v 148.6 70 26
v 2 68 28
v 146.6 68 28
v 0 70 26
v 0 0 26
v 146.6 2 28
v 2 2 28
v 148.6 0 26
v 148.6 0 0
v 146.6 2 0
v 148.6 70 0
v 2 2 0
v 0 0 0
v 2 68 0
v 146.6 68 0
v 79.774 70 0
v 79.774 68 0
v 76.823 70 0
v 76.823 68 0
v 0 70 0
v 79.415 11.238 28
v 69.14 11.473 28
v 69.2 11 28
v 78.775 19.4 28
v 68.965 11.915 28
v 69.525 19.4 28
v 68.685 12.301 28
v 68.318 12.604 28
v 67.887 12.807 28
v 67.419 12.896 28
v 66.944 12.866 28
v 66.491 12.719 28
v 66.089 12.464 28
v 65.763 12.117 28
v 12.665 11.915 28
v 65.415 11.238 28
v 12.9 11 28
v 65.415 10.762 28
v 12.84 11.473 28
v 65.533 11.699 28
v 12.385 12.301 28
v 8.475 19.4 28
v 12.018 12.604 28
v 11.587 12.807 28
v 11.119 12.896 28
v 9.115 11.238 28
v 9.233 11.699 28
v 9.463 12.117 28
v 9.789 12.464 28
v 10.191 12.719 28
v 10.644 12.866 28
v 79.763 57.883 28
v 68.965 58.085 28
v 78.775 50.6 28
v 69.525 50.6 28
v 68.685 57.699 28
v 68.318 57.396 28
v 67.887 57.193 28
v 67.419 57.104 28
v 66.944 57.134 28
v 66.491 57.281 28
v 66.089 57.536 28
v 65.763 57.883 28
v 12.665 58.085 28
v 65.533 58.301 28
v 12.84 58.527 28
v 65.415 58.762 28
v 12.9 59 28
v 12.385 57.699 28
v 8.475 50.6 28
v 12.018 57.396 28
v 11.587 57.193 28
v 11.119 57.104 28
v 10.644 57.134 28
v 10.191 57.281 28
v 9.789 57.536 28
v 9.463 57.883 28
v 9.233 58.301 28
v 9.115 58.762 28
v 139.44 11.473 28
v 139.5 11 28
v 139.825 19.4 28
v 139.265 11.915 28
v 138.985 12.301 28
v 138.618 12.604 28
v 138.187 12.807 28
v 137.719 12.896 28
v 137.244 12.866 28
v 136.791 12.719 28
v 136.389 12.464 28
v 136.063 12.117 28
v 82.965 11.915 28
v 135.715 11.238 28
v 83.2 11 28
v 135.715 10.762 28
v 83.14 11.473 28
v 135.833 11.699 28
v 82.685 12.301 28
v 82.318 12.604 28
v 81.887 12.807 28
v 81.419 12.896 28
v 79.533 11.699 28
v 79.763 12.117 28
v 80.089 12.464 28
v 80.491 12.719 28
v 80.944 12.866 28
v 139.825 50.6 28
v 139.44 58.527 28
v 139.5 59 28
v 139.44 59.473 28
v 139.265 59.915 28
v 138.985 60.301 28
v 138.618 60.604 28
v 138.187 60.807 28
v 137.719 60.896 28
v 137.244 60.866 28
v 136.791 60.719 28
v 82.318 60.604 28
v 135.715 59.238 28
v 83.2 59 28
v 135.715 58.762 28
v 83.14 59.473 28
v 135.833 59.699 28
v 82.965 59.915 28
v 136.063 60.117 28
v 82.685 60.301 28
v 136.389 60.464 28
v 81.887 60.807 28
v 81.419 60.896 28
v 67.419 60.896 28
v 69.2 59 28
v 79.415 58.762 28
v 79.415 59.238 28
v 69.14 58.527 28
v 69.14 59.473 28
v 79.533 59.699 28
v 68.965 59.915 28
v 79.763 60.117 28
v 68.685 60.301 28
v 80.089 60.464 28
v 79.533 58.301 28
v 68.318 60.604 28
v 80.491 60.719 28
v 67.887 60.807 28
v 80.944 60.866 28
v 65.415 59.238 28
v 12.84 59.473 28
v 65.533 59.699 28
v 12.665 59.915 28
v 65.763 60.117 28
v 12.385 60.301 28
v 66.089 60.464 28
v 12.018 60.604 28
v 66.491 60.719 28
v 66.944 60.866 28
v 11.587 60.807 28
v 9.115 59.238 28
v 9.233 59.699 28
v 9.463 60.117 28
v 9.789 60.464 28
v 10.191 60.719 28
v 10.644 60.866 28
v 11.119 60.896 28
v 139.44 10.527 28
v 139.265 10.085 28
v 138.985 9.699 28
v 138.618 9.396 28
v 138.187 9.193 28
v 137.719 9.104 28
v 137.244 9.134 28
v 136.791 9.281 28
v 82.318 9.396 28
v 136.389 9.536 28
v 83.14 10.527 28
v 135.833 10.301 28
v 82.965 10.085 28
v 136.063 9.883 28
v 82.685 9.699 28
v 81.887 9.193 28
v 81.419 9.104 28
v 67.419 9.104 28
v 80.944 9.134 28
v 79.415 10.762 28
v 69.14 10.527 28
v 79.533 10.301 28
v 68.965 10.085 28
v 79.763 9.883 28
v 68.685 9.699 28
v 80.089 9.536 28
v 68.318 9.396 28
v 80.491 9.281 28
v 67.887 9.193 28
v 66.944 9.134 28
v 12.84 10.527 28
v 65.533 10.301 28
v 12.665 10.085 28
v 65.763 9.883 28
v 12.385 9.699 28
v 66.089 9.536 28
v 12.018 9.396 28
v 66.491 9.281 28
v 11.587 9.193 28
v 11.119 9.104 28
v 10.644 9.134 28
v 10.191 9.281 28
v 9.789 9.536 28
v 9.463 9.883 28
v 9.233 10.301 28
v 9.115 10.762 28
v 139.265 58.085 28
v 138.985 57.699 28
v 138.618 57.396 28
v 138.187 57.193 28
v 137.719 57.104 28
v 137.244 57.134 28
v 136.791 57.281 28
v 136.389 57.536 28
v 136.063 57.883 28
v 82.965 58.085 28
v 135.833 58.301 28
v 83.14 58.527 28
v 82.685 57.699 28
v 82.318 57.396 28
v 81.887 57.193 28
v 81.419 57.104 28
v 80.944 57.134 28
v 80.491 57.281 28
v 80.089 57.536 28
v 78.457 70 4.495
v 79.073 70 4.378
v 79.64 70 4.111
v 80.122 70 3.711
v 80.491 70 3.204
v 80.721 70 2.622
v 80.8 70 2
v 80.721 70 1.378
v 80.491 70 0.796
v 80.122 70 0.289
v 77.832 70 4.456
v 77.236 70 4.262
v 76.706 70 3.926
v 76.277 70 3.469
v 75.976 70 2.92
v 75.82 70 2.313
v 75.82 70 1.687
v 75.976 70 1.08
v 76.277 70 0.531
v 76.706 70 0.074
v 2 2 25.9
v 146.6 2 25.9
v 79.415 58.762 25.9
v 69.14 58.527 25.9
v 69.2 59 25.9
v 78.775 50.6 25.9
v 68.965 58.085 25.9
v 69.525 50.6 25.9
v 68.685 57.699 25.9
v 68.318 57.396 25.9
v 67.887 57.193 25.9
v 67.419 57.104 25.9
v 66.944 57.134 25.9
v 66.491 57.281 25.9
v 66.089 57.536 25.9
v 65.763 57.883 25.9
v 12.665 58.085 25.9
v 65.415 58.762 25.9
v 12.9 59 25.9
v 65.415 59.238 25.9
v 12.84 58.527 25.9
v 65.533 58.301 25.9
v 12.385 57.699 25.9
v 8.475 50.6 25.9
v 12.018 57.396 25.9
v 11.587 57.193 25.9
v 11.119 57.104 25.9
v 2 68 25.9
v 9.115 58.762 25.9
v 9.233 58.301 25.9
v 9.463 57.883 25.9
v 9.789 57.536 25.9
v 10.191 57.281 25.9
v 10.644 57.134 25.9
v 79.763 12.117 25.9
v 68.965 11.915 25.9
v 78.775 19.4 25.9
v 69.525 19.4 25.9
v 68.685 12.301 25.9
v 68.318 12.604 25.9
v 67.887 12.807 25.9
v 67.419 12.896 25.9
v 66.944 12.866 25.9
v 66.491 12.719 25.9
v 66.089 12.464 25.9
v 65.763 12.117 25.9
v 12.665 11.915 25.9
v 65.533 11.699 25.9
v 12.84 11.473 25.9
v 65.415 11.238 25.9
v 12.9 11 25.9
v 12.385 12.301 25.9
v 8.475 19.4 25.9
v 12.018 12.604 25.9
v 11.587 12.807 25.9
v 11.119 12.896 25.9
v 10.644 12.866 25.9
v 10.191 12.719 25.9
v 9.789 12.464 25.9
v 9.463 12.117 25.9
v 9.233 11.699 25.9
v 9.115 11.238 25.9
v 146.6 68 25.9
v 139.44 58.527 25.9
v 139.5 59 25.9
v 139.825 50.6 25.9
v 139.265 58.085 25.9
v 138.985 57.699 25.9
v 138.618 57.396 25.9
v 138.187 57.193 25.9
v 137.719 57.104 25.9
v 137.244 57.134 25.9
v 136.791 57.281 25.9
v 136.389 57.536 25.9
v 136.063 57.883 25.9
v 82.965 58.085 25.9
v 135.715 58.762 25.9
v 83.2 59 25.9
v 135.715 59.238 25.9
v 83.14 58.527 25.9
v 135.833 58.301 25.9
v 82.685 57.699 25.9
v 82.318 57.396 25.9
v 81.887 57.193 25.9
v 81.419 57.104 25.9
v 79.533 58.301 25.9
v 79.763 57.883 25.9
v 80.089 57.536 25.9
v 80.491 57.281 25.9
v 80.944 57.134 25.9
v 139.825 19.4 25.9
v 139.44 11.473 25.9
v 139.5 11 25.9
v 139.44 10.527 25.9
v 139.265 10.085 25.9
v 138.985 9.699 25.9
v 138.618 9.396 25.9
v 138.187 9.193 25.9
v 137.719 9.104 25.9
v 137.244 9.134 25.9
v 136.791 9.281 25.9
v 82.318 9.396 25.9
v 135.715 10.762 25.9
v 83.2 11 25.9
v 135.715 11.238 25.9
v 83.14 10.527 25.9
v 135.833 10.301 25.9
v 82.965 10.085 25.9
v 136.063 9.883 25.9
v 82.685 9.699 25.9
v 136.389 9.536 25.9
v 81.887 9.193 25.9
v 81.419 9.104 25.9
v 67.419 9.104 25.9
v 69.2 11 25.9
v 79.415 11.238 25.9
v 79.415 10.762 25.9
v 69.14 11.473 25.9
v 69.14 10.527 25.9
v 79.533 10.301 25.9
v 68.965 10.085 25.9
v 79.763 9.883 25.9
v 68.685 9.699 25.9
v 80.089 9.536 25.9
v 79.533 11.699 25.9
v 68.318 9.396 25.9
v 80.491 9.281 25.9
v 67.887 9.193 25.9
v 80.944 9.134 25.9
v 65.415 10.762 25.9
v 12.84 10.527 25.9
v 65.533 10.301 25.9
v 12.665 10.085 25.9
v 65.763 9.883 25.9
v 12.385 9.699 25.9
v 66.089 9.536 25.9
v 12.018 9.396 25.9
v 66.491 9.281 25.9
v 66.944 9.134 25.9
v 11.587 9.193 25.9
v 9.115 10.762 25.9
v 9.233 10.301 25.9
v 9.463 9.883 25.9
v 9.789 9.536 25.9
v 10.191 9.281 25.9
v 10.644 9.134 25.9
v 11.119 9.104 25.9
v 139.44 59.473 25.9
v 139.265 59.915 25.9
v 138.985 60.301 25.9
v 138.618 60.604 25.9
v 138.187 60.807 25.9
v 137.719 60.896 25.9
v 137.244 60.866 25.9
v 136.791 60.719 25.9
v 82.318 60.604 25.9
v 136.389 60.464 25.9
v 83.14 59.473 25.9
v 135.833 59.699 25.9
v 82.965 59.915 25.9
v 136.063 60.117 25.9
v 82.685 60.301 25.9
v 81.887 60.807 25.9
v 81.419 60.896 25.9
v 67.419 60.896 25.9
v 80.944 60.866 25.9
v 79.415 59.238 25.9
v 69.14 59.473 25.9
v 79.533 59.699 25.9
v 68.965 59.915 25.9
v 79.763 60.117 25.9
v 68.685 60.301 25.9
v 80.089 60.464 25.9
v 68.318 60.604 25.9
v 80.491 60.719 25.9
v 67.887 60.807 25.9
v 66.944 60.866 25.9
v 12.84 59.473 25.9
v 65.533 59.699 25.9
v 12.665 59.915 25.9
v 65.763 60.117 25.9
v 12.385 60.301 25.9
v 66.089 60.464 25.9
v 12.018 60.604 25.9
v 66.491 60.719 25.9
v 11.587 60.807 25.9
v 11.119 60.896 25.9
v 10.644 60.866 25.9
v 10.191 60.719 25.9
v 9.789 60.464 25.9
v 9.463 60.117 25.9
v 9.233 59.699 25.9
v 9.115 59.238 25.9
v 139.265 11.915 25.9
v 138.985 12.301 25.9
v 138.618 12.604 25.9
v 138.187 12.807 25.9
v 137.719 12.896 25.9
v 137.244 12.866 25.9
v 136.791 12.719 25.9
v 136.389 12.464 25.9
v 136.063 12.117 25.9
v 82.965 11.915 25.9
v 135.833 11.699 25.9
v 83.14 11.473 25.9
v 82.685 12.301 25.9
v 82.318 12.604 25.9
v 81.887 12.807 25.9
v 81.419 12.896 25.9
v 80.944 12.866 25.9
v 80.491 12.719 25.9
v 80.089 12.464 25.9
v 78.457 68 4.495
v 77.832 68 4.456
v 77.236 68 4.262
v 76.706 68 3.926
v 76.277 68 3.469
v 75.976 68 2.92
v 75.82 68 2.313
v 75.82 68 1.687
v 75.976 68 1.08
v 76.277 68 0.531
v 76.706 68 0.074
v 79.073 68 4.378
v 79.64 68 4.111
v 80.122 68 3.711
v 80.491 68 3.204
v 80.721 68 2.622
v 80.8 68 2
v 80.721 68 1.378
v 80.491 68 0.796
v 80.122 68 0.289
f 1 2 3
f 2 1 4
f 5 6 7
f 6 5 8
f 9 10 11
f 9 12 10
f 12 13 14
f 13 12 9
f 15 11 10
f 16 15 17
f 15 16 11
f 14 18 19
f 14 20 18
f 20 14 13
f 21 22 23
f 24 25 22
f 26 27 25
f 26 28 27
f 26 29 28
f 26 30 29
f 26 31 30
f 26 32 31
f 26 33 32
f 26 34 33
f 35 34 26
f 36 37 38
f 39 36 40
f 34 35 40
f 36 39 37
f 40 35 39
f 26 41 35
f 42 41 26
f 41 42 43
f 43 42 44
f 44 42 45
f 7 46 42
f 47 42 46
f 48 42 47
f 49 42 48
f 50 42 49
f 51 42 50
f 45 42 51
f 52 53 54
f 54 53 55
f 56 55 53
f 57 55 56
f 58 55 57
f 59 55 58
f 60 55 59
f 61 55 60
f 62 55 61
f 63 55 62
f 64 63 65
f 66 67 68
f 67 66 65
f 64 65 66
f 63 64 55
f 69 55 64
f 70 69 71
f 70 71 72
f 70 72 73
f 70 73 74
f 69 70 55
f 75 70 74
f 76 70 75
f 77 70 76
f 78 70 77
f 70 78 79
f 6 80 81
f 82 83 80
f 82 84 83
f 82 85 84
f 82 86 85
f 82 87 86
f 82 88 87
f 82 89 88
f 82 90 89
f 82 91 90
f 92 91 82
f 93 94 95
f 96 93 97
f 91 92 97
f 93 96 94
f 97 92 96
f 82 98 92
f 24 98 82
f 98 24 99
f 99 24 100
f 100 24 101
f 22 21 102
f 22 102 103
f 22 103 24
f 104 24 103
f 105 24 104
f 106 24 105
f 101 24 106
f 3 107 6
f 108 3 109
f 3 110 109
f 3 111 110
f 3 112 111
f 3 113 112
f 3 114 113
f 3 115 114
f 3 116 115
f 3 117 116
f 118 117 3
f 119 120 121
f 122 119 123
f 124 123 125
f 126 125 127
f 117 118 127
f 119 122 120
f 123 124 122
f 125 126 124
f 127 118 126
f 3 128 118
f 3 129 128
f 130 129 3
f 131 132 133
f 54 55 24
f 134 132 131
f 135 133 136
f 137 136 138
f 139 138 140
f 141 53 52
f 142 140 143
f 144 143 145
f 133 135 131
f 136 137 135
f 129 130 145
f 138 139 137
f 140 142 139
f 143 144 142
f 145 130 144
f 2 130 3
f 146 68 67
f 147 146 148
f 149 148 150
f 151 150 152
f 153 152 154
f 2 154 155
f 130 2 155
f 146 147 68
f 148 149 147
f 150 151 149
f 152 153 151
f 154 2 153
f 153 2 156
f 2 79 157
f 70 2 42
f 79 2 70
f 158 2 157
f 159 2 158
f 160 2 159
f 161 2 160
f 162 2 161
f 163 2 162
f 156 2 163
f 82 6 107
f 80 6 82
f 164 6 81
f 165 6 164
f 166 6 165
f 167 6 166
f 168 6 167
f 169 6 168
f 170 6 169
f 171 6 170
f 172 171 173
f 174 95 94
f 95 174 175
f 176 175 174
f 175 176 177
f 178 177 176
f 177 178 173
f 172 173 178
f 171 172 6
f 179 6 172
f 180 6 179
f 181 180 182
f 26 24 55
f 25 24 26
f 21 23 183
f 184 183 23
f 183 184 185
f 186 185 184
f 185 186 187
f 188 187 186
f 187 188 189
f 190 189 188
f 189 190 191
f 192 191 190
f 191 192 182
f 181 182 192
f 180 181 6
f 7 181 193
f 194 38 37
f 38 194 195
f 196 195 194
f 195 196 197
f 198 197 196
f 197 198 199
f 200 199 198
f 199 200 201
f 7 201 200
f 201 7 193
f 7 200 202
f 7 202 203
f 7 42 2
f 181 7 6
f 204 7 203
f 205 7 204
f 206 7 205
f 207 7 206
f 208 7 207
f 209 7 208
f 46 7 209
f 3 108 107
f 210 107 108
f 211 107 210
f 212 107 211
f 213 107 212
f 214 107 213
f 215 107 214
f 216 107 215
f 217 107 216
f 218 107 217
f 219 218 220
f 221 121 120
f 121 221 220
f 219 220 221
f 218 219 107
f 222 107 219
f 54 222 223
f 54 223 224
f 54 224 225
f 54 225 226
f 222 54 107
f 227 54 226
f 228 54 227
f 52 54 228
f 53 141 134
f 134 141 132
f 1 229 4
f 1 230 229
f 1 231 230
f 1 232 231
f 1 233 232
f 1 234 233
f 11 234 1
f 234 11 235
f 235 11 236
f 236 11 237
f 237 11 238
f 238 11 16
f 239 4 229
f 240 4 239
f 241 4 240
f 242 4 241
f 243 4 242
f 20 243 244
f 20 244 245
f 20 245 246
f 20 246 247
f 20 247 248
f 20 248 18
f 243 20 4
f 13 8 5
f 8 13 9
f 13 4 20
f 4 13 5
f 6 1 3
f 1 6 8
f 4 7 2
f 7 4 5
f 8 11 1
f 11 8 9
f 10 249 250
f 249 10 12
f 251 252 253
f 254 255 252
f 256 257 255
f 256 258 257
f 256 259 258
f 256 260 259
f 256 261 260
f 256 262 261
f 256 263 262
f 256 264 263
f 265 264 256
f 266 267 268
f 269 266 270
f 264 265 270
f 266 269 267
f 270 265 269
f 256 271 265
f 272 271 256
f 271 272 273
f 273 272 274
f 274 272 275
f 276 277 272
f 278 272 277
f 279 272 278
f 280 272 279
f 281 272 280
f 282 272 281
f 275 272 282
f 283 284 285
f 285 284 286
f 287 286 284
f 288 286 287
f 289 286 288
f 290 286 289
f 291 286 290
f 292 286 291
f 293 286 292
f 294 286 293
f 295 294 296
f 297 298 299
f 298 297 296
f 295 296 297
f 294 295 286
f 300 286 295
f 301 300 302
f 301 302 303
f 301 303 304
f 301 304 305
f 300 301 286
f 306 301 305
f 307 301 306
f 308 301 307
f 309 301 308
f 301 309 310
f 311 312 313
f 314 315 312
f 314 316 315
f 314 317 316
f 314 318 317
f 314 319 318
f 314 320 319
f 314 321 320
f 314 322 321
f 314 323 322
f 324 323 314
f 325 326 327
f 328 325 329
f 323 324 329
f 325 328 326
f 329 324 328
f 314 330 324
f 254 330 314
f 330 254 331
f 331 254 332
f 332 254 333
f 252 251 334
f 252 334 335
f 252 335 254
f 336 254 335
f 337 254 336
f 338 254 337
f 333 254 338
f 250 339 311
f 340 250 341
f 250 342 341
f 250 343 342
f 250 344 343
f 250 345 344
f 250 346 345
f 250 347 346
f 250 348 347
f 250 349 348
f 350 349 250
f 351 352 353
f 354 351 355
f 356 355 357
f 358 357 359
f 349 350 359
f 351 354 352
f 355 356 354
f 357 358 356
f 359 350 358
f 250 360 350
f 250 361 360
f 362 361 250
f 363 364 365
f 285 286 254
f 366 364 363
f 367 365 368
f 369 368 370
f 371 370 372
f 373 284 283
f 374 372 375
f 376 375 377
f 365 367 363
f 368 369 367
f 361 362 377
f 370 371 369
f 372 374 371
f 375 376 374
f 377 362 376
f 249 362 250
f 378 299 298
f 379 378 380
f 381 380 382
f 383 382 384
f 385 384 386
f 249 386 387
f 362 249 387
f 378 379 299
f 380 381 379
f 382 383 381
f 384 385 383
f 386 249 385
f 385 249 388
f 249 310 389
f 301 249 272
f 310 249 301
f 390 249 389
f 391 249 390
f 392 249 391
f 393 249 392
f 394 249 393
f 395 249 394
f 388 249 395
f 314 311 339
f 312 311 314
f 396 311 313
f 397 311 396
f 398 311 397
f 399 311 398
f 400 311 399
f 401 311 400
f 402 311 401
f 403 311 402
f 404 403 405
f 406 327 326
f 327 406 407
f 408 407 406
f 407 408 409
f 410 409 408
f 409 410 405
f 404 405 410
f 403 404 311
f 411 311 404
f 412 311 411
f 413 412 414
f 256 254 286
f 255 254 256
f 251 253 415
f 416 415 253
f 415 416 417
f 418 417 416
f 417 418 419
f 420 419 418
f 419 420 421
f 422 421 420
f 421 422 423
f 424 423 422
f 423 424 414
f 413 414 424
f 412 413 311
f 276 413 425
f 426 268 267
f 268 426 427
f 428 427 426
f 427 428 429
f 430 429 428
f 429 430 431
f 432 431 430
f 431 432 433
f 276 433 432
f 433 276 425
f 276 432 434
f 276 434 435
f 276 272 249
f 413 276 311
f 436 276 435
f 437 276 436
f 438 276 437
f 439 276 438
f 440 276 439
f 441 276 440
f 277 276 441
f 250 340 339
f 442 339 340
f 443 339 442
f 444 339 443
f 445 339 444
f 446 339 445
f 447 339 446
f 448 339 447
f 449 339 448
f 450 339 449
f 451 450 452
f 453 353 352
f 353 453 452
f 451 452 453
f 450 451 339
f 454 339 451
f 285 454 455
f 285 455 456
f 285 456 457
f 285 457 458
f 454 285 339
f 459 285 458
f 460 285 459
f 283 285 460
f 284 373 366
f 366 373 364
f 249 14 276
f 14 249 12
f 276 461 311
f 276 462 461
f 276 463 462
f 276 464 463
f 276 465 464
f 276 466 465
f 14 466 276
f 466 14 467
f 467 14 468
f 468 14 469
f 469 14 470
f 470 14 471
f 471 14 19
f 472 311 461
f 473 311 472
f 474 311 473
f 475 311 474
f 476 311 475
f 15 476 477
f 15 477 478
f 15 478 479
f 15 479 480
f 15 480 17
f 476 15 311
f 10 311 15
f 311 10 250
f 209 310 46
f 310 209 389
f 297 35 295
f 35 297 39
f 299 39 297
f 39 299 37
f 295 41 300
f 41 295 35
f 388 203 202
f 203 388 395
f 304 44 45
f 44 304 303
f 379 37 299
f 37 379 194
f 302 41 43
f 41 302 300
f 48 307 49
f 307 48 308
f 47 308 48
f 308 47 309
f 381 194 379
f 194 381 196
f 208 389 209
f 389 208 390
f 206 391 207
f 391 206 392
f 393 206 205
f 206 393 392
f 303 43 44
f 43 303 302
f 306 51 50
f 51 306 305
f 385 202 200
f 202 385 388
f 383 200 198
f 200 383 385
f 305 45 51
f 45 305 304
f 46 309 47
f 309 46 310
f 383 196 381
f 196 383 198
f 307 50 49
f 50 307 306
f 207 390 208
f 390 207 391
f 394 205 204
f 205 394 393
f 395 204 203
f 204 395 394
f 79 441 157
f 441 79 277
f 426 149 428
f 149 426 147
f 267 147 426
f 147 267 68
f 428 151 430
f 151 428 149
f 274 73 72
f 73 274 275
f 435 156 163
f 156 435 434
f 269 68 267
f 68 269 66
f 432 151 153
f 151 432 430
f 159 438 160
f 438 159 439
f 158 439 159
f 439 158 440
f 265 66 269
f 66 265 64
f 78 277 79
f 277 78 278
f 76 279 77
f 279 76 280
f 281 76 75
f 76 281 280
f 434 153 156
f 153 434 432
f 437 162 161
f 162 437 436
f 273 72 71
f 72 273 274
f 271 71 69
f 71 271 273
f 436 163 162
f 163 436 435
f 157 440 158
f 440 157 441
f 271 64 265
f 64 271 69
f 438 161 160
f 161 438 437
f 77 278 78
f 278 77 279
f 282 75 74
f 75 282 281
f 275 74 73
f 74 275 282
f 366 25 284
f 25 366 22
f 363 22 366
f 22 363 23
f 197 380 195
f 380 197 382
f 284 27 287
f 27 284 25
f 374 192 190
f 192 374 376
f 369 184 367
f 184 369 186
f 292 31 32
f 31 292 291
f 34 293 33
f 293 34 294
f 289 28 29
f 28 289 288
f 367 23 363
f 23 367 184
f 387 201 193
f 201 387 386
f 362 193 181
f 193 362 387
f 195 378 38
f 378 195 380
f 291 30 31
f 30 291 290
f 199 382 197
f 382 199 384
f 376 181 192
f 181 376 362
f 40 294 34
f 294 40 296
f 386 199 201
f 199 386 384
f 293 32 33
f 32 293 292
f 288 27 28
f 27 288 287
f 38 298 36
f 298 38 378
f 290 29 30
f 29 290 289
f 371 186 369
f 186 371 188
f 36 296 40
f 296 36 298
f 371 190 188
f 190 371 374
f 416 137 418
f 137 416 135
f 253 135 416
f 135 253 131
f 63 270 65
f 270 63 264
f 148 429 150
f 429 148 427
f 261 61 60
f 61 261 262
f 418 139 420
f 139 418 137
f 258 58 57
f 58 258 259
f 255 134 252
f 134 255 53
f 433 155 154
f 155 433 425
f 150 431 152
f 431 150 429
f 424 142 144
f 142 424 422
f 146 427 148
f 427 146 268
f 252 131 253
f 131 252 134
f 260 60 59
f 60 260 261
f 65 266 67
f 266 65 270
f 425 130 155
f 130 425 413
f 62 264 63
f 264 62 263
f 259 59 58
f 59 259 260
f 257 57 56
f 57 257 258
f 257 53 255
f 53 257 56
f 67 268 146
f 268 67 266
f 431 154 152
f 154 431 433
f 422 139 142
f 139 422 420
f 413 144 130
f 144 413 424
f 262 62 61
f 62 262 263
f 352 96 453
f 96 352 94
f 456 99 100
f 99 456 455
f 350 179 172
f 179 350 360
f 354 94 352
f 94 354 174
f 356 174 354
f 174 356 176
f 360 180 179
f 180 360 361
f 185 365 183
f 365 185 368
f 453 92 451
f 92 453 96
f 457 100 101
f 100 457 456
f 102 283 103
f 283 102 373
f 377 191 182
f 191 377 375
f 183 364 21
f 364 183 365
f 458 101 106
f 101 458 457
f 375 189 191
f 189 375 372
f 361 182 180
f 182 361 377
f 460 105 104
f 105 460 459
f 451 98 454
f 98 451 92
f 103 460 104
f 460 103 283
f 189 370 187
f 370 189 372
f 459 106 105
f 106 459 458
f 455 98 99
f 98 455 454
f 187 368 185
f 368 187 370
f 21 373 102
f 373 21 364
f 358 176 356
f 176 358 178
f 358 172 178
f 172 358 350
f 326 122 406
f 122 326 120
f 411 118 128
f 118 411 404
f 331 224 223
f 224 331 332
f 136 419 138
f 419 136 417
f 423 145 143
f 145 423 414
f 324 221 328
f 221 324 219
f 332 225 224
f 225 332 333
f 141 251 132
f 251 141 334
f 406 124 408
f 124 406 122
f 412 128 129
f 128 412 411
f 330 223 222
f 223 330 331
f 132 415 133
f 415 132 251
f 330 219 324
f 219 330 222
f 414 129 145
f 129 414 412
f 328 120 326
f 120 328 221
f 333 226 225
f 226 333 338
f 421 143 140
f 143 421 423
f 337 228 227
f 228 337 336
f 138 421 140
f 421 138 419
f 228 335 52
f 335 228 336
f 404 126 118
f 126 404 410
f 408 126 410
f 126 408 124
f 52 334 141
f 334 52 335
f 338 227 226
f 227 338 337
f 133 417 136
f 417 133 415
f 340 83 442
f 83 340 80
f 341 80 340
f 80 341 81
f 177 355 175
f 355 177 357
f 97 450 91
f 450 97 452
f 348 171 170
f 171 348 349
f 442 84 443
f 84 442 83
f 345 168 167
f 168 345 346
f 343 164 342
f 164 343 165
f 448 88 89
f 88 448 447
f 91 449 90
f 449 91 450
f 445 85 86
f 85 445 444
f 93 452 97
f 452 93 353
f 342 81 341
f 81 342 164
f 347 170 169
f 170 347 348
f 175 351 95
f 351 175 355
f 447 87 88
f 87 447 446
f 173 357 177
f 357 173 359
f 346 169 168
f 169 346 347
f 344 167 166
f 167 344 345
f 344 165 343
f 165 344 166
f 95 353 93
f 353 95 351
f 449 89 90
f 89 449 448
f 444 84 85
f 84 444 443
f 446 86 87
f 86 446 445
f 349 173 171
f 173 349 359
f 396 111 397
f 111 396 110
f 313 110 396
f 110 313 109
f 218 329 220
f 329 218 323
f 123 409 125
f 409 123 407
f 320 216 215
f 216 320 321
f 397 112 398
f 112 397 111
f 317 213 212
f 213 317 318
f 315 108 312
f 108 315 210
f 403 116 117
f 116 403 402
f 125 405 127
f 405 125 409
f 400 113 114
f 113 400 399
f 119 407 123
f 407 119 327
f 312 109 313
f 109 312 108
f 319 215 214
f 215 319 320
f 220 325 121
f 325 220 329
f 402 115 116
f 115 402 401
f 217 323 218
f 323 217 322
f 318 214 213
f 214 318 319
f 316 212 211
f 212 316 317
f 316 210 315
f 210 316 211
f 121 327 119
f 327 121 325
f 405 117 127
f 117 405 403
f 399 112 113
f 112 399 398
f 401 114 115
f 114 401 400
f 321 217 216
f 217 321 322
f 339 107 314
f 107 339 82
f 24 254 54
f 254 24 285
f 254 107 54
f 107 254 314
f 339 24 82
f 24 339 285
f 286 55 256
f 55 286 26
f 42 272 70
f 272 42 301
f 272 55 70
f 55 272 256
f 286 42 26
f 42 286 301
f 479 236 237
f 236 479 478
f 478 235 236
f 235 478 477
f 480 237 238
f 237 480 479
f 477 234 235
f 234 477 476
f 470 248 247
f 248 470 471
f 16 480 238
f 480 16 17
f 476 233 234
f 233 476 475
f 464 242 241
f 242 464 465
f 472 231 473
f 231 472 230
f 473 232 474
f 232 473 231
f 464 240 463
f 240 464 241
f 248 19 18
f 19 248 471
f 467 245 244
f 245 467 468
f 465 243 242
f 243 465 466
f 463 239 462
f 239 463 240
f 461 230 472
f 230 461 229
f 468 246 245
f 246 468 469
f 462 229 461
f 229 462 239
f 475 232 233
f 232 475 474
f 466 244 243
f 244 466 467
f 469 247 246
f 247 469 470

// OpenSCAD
/* This is a customizable housing for lixie displays

    Dustin Westaby 
    Nov 2022

    USAGE:
    
    Enter the number of displays you want, and you will get an object that you can print as is, or split up for your printer
    
*/

// ********************
// USER DEFINES
// ********************
// Set options here

digits = 2; //Min is 1

chamfer = 2;

screw_hole_diameter = 3; //M3 = 3mm

want_button = 0;

want_power_cable = 1;

want_pre_cuts_and_glue_tabs = 1;

switch_hole_diameter = 12; //set want_button=1

usb_cable_diameter = 5;  //set want_power_cable=1

window_x = 59.05;
window_y = 29.20;

max_printer_bed_size = 180; //set want_pre_cuts_and_glue_tabs=1, Prusa Mk3 = 21cm (8.3")

// ********************
// CALCULATED
// ********************

side_wall_thickness = 2; //2 or 3mm

top_wall_thickness = 2 ;

loose_fit = 2.0;
slide_fit = 0.2;
friction_fit = 0.02;

center_digits = digits-2;

edge_length = 74.3;
center_length = 70.3;

outer_length_x = edge_length*2 + center_digits*center_length;
outer_width_y  = 70;

outer_depth_z  = 26 + top_wall_thickness;

switch_hole_z_offset_from_center = outer_depth_z/2-top_wall_thickness/2;

window_x_size_adj = window_x + loose_fit;
window_y_size_adj = window_y + loose_fit;

glue_tab_insert_depth = 4;

// ********************
// MODULES
// ********************

//max_printer_bed_size
if((want_pre_cuts_and_glue_tabs == 0) || outer_length_x < max_printer_bed_size)
{
    draw_body();
}
else
{
    cut_offsets = glue_tab_insert_depth*2;
    
    //cut up the body every max_printer_bed_size size

    number_of_cuts = ceil(outer_length_x / max_printer_bed_size); //round up
    negative_width = number_of_cuts - 1;
    
    //left side
    draw_body_cut(
        x1_position = outer_length_x * 1 / number_of_cuts, 
        cut_width  = outer_length_x  * negative_width / number_of_cuts, 
        cut_offset = cut_offsets * 0, 
        want_tabs  = true);
    
    //inner parts
    if(number_of_cuts-2 > 0)
    {
        for(i = [1 : number_of_cuts-2])
        {
            cut_width = outer_length_x  * negative_width / number_of_cuts;
            slice_width = outer_length_x / number_of_cuts;
            
            draw_body_cut(
                x1_position = -cut_width+slice_width*i, 
                x2_position = slice_width*(i+1), 
                cut_width  = cut_width,
                cut_offset = cut_offsets * i, 
                want_tabs  = true);
        }
    }
    
    //right side
    draw_body_cut(
        x1_position = 0, 
        cut_width  = outer_length_x  * negative_width / number_of_cuts, 
        cut_offset = cut_offsets * (number_of_cuts-1), 
        want_tabs  = false);
    
}

module draw_body_cut(x1_position, x2_position=0, cut_width, cut_offset, want_tabs=false)
{
    translate([cut_offset,0,0]) 
    difference()
    {
        draw_body();
        
        //cutter 1
        translate([x1_position-1,-1,-1]) 
        cube([cut_width+2,outer_width_y+2,outer_depth_z+2]);
        
        //cutter 2
        if(x2_position != 0) translate([x2_position-1,-1,-1]) 
        cube([cut_width+2,outer_width_y+2,outer_depth_z+2]);
    }
    if(want_tabs)
    {
        if(x2_position > 0)
        {
            glue_tabs((x2_position - 1 + cut_offset) - glue_tab_insert_depth);
        }
        else
        {
            glue_tabs((x1_position - 1) - glue_tab_insert_depth);
        }
    }
}

module draw_body()
{
    difference()
    {
        union()
        {
            outer_base_shape(use_chamfer=true);
            if(want_button) draw_switch_outline();
        }
        
        inner_base_shape();
        
        display_and_screw_cutouts();
        
        if(want_button) draw_button();
            
        if(want_power_cable) draw_power_cable();
    }
}

//TBD, tabs
module glue_tabs(x_position)
{
    translate([x_position,0,0])
    {
        translate([0,side_wall_thickness,0])
        glue_tab();
        
        translate([0,outer_width_y-side_wall_thickness*2,0])
        glue_tab();
    }
}

module glue_tab()
{
    z_alignment = 0.5;
    
    tab_height = outer_depth_z-top_wall_thickness*2-4;
    
    //tab
    cube([glue_tab_insert_depth*2, side_wall_thickness, tab_height+z_alignment]);
    
    //printability ledge
    translate([-glue_tab_insert_depth+0.68,0,0])
    difference()
    {
        translate([0,0,tab_height+z_alignment])
        rotate([0,45,0]) cube([glue_tab_insert_depth*2, side_wall_thickness, glue_tab_insert_depth*2]);
        
        translate([-glue_tab_insert_depth*1.17,-2,0])
        cube([glue_tab_insert_depth*2, side_wall_thickness+4, tab_height*2+z_alignment]);
    }
}


module draw_power_cable()
{
    
    hole_depth = side_wall_thickness*2;
    x_position = outer_length_x-(edge_length-side_wall_thickness*2);
    
    //switch_hole_diameter
    translate([x_position,outer_width_y-hole_depth-0.1,usb_cable_diameter/2-0.5]) 
    //cube([usb_cable_diameter,hole_depth+0.2,usb_cable_diameter]);
    rotate([-90,0,0])
    cylinder(d=usb_cable_diameter, h=hole_depth+0.2, $fn=25);
}

module screw_hole()
{
    //for nuts and bolts to BASES.dxf
    cylinder(d=screw_hole_diameter + slide_fit*2 + slide_fit*2, h=outer_depth_z*2, $fn=25);
}

module screw_hole_set(x_offset)
{
    edge_x_offset = 11+x_offset;
    edge_y_offset = 11;
    window_width = 56.3;
    
    translate([edge_x_offset,edge_y_offset,0]) screw_hole();
    translate([edge_x_offset,outer_width_y-edge_y_offset,0]) screw_hole();
    
    translate([window_width+edge_x_offset,edge_y_offset,0]) screw_hole();
    translate([window_width+edge_x_offset,outer_width_y-edge_y_offset,0]) screw_hole();
}

module draw_button()
{
    draw_switch_holes();
}


module draw_switch_cyl(diameter)
{
    hole_depth = side_wall_thickness*1.1;
    x_position = outer_length_x-(edge_length-side_wall_thickness*2);
    
    //switch_hole_diameter
    translate([x_position,0+hole_depth/2-0.01,switch_hole_z_offset_from_center]) rotate([90,0,0]) cylinder(h=hole_depth, d=diameter);
}

module draw_switch_outline()
{
    switch_outline_pad = 2.25;
    draw_switch_cyl(switch_hole_diameter+switch_outline_pad);
}

module draw_switch_holes()
{
    translate([0,-0.01,0]) draw_switch_cyl(switch_hole_diameter);
    translate([0,2,0]) draw_switch_cyl(switch_hole_diameter+4);
}


module display_and_screw_cutouts()
{
    x_offset = center_length;
    
    display_cutout(0);
    screw_hole_set(0);
    
    if(center_digits > 0)
    {
        for(i = [0 : center_digits])
        {
            screw_hole_set(x_offset*(i+1));
            display_cutout(x_offset*(i+1));
        }
        display_cutout(x_offset*(center_digits+1));
    }
    else
    {
        display_cutout(x_offset);
        screw_hole_set(x_offset);
    }
}

module display_cutout(x_offset)
{
    display_x_position = -window_x_size_adj/2+39+x_offset;
    display_y_position = -window_y_size_adj/2+35;
    
    translate([display_x_position,display_y_position,-0.5])
    cube([window_x_size_adj,window_y_size_adj,outer_depth_z+1]);
}

module outer_base_yz_2d_shape(chamfer_adj)
{
    polygon(points=[
        [0,0],
        [outer_depth_z-chamfer_adj, 0],
        [outer_depth_z,             chamfer_adj],
        [outer_depth_z,             outer_width_y-chamfer_adj],
        [outer_depth_z-chamfer_adj, outer_width_y],
        [0,                         outer_width_y],
    ]);
}

module outer_base_xz_2d_shape(chamfer_adj)
{
    polygon(points=[
        [0,0],
        [outer_depth_z-chamfer_adj, 0],
        [outer_depth_z,             chamfer_adj],
        [outer_depth_z,             outer_length_x-chamfer_adj],
        [outer_depth_z-chamfer_adj, outer_length_x],
        [0,                         outer_length_x],
    ]);
}


module outer_base_shape(use_chamfer)
{
    chamfer_adj = use_chamfer ? chamfer : 0;
    
    intersection()
    {
        translate([outer_length_x,0,0])
        rotate([0,-90,0])
        linear_extrude(outer_length_x) 
        outer_base_yz_2d_shape(chamfer_adj);
        
        translate([0,0,0])
        rotate([-90,-90,0])
        linear_extrude(outer_width_y) 
        outer_base_xz_2d_shape(chamfer_adj);
    }
}

module inner_base_shape()
{
    translate([side_wall_thickness,side_wall_thickness,-0.1])
    resize([outer_length_x-side_wall_thickness*2, outer_width_y-side_wall_thickness*2, outer_depth_z-top_wall_thickness]) 
    outer_base_shape(use_chamfer=false);
}   
